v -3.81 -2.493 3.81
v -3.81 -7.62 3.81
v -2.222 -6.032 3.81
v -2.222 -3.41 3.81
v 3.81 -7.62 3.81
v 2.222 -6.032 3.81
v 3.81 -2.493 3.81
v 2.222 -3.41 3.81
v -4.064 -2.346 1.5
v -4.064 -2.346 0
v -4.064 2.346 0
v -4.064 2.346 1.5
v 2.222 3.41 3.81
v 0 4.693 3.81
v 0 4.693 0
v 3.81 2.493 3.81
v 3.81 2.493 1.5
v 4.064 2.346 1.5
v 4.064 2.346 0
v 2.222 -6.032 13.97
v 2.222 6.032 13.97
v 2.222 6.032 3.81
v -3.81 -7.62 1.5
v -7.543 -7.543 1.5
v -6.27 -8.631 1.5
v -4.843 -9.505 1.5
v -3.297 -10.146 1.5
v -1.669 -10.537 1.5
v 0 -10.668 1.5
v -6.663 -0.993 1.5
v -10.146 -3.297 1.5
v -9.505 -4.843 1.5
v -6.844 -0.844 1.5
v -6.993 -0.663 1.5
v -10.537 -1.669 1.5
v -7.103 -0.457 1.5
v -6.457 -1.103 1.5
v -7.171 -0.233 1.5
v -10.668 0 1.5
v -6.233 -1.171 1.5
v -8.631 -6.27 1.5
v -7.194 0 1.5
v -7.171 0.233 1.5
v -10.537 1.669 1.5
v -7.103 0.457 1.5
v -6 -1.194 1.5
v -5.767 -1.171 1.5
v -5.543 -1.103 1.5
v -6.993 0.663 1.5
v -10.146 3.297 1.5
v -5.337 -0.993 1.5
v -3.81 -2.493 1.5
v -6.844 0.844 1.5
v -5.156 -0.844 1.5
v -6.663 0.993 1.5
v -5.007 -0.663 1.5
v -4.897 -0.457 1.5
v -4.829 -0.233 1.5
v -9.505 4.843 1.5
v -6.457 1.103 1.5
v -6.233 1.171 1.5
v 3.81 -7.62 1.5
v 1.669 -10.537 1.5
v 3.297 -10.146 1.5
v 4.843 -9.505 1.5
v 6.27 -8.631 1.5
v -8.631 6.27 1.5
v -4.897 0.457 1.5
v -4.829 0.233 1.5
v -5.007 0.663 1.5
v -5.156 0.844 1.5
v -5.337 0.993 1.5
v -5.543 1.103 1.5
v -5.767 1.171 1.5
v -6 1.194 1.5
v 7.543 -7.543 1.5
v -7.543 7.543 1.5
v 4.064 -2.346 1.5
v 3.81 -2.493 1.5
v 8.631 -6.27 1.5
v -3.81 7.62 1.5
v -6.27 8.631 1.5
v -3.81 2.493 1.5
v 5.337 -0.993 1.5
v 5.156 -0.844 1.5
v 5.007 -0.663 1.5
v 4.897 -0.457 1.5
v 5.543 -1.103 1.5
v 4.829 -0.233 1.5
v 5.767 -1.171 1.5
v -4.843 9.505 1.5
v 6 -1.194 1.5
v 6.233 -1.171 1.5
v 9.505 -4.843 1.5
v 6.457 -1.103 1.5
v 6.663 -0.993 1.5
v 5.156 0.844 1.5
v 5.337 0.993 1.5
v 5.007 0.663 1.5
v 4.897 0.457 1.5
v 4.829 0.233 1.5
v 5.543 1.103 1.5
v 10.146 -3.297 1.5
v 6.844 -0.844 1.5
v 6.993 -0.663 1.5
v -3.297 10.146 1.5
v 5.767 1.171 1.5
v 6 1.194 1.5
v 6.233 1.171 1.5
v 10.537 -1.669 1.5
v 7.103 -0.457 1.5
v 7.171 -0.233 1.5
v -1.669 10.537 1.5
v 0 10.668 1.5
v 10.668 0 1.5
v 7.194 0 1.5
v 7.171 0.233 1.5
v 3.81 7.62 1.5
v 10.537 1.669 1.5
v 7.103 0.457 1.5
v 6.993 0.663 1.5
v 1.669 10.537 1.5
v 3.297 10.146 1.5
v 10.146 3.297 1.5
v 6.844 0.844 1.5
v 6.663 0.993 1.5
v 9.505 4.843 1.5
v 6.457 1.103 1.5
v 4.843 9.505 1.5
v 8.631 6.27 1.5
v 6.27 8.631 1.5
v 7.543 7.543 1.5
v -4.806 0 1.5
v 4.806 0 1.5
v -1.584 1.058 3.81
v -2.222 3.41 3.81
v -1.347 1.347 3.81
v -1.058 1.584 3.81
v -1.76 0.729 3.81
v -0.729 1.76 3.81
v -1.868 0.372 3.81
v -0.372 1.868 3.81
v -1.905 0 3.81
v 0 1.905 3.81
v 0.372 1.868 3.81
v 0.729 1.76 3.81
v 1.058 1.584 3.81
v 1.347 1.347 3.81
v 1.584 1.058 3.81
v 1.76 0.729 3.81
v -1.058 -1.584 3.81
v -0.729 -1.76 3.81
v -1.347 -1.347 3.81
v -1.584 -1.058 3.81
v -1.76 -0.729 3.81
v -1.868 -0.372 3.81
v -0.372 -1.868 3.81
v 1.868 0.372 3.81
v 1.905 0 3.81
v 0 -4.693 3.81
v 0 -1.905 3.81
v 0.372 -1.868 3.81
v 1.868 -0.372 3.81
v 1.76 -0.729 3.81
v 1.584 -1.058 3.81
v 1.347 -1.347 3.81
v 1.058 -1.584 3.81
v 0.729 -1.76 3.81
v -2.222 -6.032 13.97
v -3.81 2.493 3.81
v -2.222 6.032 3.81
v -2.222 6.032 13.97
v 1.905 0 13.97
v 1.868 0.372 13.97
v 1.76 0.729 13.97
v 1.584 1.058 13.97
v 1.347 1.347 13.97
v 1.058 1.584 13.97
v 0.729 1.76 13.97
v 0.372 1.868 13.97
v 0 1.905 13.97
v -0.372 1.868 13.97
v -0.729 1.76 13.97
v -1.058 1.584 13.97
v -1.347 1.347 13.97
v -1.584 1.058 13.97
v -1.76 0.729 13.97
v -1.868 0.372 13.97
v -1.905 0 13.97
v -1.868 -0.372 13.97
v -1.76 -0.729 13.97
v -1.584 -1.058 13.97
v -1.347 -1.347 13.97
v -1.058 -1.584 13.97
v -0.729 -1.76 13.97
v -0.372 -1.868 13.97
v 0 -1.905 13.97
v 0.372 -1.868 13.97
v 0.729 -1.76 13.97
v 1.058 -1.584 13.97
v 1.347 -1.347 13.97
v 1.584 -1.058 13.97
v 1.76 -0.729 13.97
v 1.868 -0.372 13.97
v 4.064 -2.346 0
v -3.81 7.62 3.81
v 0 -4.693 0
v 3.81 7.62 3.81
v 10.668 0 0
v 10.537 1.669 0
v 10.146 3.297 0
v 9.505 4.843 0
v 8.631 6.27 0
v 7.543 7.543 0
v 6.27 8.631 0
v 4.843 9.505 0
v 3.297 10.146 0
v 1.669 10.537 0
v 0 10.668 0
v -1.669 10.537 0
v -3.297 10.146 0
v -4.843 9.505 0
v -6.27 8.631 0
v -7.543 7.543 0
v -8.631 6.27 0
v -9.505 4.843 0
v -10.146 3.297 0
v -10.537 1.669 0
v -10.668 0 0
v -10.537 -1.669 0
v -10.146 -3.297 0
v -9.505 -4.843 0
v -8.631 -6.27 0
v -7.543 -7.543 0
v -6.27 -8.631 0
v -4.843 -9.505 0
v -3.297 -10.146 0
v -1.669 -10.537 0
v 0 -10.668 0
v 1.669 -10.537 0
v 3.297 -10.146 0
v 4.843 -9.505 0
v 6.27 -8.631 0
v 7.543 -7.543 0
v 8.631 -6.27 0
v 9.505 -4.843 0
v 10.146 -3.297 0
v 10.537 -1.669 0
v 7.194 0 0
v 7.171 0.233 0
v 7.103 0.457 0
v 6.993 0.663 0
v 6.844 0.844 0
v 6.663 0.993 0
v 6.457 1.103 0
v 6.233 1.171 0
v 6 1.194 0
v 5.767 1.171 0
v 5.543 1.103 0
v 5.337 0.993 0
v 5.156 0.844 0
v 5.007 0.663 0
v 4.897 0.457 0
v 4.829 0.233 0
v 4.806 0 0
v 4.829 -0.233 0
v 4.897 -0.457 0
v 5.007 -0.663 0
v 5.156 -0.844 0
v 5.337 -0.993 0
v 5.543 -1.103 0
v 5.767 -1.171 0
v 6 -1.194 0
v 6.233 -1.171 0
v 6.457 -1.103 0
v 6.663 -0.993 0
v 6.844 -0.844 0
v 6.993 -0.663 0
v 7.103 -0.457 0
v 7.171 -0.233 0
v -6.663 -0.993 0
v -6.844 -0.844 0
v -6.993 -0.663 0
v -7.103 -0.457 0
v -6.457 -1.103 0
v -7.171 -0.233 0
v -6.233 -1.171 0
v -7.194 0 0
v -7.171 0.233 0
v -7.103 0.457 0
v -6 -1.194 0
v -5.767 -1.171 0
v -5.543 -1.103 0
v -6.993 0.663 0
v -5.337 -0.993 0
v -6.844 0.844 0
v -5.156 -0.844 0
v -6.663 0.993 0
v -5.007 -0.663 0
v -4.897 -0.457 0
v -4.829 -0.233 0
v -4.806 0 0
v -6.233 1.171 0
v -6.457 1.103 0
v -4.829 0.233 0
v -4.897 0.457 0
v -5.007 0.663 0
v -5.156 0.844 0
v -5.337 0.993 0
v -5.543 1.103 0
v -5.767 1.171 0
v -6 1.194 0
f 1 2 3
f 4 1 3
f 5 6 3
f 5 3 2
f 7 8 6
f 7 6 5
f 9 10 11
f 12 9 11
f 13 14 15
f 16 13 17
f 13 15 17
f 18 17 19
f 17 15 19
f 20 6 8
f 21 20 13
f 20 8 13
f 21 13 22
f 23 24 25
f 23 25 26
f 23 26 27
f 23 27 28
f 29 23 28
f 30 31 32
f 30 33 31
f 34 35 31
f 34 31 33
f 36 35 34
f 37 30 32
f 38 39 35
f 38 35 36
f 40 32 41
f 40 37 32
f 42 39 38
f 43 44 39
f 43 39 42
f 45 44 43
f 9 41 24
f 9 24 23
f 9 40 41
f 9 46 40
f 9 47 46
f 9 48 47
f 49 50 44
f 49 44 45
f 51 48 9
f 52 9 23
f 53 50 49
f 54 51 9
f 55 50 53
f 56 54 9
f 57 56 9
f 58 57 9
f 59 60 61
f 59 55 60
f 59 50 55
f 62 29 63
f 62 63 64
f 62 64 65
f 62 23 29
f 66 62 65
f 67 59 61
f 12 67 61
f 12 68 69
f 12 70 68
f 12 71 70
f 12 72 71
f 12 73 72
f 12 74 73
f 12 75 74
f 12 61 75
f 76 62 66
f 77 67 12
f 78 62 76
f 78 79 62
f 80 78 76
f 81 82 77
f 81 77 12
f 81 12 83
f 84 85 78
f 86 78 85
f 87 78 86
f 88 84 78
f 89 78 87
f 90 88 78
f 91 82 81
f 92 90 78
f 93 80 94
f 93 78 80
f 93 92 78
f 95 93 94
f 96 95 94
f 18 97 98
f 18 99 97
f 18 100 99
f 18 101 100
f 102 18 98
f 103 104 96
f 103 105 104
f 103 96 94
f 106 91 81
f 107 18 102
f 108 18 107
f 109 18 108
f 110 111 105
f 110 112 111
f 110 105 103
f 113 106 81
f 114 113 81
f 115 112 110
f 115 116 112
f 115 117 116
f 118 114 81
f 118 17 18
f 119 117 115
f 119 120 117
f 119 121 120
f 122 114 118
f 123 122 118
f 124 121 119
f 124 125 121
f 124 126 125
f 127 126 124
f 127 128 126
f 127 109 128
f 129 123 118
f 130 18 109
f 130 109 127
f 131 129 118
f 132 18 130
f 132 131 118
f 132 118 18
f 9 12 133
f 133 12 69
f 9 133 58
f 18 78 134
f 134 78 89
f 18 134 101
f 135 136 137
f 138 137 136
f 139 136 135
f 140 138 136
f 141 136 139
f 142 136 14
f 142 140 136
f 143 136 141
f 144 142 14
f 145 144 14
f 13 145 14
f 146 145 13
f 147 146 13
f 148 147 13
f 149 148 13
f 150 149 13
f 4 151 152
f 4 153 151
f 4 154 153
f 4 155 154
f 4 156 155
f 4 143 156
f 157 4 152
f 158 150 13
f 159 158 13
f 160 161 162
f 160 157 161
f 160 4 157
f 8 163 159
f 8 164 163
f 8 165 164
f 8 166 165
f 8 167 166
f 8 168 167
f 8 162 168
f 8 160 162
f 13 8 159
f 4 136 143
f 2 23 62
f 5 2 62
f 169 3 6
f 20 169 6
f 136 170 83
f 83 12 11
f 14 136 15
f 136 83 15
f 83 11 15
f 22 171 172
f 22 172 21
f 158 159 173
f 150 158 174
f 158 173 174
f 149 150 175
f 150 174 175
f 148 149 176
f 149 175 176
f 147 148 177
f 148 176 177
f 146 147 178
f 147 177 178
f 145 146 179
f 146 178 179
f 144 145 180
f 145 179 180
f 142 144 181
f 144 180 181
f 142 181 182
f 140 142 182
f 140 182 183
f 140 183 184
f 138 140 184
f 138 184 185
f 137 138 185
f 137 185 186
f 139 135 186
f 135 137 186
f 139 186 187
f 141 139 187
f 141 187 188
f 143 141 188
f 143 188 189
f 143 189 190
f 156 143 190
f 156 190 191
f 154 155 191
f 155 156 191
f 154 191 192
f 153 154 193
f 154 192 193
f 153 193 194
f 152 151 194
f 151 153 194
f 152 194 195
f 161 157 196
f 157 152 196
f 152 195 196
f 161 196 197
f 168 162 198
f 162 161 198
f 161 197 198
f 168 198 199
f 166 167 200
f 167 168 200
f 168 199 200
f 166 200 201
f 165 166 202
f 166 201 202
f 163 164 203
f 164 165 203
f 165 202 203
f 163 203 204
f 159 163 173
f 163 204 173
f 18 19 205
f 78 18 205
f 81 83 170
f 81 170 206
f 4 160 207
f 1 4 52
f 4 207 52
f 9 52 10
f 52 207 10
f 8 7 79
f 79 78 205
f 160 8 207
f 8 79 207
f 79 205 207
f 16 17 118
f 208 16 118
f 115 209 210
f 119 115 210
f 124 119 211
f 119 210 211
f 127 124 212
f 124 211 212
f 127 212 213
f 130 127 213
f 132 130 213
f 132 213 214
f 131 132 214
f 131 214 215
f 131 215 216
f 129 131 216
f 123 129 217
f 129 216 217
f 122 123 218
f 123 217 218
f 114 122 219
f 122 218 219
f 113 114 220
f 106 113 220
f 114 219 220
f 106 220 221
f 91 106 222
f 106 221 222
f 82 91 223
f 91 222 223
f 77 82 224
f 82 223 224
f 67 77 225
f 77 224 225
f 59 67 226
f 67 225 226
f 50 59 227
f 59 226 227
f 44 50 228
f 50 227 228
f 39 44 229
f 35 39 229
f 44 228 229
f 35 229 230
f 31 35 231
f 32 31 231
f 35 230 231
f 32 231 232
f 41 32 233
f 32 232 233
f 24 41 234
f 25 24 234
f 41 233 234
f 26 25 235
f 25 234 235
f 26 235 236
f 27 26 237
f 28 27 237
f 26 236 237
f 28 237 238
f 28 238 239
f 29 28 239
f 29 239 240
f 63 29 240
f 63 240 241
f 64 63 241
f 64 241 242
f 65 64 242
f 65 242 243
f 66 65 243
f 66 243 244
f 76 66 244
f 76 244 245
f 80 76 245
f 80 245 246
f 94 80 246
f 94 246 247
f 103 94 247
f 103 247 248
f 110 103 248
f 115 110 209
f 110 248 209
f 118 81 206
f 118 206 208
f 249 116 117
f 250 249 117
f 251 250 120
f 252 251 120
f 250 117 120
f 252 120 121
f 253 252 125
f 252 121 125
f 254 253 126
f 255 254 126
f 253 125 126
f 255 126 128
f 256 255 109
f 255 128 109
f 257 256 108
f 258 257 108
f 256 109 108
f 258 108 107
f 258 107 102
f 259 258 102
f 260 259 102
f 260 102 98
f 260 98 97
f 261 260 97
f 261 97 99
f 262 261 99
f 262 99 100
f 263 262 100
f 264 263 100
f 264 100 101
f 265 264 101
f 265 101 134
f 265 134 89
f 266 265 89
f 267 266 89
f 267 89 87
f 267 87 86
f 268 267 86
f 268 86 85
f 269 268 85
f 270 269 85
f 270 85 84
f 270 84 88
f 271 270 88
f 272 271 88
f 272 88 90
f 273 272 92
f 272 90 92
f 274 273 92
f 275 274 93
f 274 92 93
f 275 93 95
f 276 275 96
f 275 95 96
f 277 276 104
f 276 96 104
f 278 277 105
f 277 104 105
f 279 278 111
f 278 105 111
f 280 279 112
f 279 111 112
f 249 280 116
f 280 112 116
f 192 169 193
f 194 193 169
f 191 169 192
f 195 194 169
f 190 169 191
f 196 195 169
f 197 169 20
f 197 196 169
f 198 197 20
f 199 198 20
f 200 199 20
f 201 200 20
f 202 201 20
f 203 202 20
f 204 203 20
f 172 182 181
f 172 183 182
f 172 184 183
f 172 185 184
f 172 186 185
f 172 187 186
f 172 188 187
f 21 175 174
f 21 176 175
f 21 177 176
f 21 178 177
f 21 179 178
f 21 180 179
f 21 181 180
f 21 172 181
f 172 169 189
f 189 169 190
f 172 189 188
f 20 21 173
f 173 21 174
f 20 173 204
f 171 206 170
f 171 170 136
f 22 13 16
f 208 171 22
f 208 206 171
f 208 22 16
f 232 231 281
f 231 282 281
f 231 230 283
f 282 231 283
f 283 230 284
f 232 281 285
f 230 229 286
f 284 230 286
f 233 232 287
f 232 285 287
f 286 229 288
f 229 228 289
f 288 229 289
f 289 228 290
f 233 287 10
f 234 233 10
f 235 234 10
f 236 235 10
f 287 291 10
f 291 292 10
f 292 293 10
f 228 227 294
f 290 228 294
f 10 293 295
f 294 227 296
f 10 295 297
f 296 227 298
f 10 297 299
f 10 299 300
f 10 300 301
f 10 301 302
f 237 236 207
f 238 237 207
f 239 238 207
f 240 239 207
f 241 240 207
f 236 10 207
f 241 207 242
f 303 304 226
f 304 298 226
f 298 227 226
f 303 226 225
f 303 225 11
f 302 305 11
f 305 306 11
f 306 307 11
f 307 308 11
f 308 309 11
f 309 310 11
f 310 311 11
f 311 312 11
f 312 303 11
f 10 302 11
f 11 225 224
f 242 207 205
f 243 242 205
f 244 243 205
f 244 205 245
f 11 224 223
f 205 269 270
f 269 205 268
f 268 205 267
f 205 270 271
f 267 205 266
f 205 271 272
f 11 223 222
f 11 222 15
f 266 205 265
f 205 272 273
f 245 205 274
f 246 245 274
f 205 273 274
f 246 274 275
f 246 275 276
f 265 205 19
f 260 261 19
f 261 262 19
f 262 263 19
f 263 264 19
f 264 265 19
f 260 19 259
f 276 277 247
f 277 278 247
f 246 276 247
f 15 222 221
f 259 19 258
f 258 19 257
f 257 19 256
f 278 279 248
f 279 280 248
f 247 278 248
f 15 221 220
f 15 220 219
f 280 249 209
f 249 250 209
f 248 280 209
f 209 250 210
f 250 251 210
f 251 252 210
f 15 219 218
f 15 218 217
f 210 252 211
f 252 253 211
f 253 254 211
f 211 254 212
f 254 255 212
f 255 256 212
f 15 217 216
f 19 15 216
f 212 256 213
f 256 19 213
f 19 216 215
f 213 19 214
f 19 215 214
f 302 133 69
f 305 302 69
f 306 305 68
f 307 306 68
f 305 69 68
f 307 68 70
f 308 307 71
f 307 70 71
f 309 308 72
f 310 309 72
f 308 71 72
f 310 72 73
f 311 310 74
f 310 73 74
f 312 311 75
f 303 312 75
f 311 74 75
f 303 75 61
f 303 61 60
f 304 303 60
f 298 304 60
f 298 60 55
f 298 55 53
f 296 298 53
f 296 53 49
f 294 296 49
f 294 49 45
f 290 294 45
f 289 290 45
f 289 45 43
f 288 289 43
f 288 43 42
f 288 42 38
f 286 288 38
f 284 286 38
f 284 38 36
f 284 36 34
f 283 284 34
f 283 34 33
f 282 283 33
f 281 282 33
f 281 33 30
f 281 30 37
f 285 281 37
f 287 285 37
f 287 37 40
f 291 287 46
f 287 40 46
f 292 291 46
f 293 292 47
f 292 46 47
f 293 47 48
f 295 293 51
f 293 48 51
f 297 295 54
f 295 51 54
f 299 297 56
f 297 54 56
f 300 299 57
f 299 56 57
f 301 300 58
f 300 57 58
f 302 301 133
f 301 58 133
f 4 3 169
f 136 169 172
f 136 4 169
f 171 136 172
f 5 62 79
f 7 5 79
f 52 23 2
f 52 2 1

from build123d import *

# Parameters (mm, degrees)
F0_R      = 10.66798
F1_DEPTH  = 1.5
F2_W      = 7.62
F2_H      = 15.24
F3_DEPTH  = 2.31
F4_W      = 4.445
F4_H      = 12.065
F5_DEPTH  = 10.16
F6_R      = 1.905
F7_DEPTH  = 13.971
F8_R      = 1.905
F9_DEPTH  = 3.81
F10_R     = 1.19378
F11_DEPTH = 1.501


with BuildPart() as f1:
    # F0 (on Top) → F1 (new body)
    with BuildSketch(Plane.XY):
        Circle(F0_R)
    extrude(amount=F1_DEPTH)

    # F2 (on face) → F3 (join)
    with BuildSketch(Plane.XY.offset(1.5)):
        Rectangle(F2_W, F2_H)
    extrude(amount=F3_DEPTH)

    # F4 (on face) → F5 (join)
    with BuildSketch(Plane.XY.offset(3.81)):
        Rectangle(F4_W, F4_H)
    extrude(amount=F5_DEPTH)

    # F6 (on face) → F7 (cut, through all)
    with BuildSketch(Plane.XY.offset(13.97)):
        Circle(F6_R)
    extrude(amount=-F7_DEPTH, mode=Mode.SUBTRACT)

    # F8 (on face) → F9 (cut)
    with BuildSketch(Plane(origin=(0, 0, 0), x_dir=(1, 0, 0), z_dir=(0, 0, -1))):
        Polygon((4.064, 2.346351), (0, 4.692703), (-4.064, 2.346351), (-4.064, -2.346351), (0, -4.692703), (4.064, -2.346351), align=None)
        Circle(F8_R, mode=Mode.SUBTRACT)
    extrude(amount=-F9_DEPTH, mode=Mode.SUBTRACT)

    # F10 (on face) → F11 (cut, through all)
    with BuildSketch(Plane.XY.offset(1.5)):
        with Locations((-6, 0)):
            Circle(F10_R)
        with Locations((6, 0)):
            Circle(F10_R)
    extrude(amount=-F11_DEPTH, mode=Mode.SUBTRACT)


solid = f1.part
